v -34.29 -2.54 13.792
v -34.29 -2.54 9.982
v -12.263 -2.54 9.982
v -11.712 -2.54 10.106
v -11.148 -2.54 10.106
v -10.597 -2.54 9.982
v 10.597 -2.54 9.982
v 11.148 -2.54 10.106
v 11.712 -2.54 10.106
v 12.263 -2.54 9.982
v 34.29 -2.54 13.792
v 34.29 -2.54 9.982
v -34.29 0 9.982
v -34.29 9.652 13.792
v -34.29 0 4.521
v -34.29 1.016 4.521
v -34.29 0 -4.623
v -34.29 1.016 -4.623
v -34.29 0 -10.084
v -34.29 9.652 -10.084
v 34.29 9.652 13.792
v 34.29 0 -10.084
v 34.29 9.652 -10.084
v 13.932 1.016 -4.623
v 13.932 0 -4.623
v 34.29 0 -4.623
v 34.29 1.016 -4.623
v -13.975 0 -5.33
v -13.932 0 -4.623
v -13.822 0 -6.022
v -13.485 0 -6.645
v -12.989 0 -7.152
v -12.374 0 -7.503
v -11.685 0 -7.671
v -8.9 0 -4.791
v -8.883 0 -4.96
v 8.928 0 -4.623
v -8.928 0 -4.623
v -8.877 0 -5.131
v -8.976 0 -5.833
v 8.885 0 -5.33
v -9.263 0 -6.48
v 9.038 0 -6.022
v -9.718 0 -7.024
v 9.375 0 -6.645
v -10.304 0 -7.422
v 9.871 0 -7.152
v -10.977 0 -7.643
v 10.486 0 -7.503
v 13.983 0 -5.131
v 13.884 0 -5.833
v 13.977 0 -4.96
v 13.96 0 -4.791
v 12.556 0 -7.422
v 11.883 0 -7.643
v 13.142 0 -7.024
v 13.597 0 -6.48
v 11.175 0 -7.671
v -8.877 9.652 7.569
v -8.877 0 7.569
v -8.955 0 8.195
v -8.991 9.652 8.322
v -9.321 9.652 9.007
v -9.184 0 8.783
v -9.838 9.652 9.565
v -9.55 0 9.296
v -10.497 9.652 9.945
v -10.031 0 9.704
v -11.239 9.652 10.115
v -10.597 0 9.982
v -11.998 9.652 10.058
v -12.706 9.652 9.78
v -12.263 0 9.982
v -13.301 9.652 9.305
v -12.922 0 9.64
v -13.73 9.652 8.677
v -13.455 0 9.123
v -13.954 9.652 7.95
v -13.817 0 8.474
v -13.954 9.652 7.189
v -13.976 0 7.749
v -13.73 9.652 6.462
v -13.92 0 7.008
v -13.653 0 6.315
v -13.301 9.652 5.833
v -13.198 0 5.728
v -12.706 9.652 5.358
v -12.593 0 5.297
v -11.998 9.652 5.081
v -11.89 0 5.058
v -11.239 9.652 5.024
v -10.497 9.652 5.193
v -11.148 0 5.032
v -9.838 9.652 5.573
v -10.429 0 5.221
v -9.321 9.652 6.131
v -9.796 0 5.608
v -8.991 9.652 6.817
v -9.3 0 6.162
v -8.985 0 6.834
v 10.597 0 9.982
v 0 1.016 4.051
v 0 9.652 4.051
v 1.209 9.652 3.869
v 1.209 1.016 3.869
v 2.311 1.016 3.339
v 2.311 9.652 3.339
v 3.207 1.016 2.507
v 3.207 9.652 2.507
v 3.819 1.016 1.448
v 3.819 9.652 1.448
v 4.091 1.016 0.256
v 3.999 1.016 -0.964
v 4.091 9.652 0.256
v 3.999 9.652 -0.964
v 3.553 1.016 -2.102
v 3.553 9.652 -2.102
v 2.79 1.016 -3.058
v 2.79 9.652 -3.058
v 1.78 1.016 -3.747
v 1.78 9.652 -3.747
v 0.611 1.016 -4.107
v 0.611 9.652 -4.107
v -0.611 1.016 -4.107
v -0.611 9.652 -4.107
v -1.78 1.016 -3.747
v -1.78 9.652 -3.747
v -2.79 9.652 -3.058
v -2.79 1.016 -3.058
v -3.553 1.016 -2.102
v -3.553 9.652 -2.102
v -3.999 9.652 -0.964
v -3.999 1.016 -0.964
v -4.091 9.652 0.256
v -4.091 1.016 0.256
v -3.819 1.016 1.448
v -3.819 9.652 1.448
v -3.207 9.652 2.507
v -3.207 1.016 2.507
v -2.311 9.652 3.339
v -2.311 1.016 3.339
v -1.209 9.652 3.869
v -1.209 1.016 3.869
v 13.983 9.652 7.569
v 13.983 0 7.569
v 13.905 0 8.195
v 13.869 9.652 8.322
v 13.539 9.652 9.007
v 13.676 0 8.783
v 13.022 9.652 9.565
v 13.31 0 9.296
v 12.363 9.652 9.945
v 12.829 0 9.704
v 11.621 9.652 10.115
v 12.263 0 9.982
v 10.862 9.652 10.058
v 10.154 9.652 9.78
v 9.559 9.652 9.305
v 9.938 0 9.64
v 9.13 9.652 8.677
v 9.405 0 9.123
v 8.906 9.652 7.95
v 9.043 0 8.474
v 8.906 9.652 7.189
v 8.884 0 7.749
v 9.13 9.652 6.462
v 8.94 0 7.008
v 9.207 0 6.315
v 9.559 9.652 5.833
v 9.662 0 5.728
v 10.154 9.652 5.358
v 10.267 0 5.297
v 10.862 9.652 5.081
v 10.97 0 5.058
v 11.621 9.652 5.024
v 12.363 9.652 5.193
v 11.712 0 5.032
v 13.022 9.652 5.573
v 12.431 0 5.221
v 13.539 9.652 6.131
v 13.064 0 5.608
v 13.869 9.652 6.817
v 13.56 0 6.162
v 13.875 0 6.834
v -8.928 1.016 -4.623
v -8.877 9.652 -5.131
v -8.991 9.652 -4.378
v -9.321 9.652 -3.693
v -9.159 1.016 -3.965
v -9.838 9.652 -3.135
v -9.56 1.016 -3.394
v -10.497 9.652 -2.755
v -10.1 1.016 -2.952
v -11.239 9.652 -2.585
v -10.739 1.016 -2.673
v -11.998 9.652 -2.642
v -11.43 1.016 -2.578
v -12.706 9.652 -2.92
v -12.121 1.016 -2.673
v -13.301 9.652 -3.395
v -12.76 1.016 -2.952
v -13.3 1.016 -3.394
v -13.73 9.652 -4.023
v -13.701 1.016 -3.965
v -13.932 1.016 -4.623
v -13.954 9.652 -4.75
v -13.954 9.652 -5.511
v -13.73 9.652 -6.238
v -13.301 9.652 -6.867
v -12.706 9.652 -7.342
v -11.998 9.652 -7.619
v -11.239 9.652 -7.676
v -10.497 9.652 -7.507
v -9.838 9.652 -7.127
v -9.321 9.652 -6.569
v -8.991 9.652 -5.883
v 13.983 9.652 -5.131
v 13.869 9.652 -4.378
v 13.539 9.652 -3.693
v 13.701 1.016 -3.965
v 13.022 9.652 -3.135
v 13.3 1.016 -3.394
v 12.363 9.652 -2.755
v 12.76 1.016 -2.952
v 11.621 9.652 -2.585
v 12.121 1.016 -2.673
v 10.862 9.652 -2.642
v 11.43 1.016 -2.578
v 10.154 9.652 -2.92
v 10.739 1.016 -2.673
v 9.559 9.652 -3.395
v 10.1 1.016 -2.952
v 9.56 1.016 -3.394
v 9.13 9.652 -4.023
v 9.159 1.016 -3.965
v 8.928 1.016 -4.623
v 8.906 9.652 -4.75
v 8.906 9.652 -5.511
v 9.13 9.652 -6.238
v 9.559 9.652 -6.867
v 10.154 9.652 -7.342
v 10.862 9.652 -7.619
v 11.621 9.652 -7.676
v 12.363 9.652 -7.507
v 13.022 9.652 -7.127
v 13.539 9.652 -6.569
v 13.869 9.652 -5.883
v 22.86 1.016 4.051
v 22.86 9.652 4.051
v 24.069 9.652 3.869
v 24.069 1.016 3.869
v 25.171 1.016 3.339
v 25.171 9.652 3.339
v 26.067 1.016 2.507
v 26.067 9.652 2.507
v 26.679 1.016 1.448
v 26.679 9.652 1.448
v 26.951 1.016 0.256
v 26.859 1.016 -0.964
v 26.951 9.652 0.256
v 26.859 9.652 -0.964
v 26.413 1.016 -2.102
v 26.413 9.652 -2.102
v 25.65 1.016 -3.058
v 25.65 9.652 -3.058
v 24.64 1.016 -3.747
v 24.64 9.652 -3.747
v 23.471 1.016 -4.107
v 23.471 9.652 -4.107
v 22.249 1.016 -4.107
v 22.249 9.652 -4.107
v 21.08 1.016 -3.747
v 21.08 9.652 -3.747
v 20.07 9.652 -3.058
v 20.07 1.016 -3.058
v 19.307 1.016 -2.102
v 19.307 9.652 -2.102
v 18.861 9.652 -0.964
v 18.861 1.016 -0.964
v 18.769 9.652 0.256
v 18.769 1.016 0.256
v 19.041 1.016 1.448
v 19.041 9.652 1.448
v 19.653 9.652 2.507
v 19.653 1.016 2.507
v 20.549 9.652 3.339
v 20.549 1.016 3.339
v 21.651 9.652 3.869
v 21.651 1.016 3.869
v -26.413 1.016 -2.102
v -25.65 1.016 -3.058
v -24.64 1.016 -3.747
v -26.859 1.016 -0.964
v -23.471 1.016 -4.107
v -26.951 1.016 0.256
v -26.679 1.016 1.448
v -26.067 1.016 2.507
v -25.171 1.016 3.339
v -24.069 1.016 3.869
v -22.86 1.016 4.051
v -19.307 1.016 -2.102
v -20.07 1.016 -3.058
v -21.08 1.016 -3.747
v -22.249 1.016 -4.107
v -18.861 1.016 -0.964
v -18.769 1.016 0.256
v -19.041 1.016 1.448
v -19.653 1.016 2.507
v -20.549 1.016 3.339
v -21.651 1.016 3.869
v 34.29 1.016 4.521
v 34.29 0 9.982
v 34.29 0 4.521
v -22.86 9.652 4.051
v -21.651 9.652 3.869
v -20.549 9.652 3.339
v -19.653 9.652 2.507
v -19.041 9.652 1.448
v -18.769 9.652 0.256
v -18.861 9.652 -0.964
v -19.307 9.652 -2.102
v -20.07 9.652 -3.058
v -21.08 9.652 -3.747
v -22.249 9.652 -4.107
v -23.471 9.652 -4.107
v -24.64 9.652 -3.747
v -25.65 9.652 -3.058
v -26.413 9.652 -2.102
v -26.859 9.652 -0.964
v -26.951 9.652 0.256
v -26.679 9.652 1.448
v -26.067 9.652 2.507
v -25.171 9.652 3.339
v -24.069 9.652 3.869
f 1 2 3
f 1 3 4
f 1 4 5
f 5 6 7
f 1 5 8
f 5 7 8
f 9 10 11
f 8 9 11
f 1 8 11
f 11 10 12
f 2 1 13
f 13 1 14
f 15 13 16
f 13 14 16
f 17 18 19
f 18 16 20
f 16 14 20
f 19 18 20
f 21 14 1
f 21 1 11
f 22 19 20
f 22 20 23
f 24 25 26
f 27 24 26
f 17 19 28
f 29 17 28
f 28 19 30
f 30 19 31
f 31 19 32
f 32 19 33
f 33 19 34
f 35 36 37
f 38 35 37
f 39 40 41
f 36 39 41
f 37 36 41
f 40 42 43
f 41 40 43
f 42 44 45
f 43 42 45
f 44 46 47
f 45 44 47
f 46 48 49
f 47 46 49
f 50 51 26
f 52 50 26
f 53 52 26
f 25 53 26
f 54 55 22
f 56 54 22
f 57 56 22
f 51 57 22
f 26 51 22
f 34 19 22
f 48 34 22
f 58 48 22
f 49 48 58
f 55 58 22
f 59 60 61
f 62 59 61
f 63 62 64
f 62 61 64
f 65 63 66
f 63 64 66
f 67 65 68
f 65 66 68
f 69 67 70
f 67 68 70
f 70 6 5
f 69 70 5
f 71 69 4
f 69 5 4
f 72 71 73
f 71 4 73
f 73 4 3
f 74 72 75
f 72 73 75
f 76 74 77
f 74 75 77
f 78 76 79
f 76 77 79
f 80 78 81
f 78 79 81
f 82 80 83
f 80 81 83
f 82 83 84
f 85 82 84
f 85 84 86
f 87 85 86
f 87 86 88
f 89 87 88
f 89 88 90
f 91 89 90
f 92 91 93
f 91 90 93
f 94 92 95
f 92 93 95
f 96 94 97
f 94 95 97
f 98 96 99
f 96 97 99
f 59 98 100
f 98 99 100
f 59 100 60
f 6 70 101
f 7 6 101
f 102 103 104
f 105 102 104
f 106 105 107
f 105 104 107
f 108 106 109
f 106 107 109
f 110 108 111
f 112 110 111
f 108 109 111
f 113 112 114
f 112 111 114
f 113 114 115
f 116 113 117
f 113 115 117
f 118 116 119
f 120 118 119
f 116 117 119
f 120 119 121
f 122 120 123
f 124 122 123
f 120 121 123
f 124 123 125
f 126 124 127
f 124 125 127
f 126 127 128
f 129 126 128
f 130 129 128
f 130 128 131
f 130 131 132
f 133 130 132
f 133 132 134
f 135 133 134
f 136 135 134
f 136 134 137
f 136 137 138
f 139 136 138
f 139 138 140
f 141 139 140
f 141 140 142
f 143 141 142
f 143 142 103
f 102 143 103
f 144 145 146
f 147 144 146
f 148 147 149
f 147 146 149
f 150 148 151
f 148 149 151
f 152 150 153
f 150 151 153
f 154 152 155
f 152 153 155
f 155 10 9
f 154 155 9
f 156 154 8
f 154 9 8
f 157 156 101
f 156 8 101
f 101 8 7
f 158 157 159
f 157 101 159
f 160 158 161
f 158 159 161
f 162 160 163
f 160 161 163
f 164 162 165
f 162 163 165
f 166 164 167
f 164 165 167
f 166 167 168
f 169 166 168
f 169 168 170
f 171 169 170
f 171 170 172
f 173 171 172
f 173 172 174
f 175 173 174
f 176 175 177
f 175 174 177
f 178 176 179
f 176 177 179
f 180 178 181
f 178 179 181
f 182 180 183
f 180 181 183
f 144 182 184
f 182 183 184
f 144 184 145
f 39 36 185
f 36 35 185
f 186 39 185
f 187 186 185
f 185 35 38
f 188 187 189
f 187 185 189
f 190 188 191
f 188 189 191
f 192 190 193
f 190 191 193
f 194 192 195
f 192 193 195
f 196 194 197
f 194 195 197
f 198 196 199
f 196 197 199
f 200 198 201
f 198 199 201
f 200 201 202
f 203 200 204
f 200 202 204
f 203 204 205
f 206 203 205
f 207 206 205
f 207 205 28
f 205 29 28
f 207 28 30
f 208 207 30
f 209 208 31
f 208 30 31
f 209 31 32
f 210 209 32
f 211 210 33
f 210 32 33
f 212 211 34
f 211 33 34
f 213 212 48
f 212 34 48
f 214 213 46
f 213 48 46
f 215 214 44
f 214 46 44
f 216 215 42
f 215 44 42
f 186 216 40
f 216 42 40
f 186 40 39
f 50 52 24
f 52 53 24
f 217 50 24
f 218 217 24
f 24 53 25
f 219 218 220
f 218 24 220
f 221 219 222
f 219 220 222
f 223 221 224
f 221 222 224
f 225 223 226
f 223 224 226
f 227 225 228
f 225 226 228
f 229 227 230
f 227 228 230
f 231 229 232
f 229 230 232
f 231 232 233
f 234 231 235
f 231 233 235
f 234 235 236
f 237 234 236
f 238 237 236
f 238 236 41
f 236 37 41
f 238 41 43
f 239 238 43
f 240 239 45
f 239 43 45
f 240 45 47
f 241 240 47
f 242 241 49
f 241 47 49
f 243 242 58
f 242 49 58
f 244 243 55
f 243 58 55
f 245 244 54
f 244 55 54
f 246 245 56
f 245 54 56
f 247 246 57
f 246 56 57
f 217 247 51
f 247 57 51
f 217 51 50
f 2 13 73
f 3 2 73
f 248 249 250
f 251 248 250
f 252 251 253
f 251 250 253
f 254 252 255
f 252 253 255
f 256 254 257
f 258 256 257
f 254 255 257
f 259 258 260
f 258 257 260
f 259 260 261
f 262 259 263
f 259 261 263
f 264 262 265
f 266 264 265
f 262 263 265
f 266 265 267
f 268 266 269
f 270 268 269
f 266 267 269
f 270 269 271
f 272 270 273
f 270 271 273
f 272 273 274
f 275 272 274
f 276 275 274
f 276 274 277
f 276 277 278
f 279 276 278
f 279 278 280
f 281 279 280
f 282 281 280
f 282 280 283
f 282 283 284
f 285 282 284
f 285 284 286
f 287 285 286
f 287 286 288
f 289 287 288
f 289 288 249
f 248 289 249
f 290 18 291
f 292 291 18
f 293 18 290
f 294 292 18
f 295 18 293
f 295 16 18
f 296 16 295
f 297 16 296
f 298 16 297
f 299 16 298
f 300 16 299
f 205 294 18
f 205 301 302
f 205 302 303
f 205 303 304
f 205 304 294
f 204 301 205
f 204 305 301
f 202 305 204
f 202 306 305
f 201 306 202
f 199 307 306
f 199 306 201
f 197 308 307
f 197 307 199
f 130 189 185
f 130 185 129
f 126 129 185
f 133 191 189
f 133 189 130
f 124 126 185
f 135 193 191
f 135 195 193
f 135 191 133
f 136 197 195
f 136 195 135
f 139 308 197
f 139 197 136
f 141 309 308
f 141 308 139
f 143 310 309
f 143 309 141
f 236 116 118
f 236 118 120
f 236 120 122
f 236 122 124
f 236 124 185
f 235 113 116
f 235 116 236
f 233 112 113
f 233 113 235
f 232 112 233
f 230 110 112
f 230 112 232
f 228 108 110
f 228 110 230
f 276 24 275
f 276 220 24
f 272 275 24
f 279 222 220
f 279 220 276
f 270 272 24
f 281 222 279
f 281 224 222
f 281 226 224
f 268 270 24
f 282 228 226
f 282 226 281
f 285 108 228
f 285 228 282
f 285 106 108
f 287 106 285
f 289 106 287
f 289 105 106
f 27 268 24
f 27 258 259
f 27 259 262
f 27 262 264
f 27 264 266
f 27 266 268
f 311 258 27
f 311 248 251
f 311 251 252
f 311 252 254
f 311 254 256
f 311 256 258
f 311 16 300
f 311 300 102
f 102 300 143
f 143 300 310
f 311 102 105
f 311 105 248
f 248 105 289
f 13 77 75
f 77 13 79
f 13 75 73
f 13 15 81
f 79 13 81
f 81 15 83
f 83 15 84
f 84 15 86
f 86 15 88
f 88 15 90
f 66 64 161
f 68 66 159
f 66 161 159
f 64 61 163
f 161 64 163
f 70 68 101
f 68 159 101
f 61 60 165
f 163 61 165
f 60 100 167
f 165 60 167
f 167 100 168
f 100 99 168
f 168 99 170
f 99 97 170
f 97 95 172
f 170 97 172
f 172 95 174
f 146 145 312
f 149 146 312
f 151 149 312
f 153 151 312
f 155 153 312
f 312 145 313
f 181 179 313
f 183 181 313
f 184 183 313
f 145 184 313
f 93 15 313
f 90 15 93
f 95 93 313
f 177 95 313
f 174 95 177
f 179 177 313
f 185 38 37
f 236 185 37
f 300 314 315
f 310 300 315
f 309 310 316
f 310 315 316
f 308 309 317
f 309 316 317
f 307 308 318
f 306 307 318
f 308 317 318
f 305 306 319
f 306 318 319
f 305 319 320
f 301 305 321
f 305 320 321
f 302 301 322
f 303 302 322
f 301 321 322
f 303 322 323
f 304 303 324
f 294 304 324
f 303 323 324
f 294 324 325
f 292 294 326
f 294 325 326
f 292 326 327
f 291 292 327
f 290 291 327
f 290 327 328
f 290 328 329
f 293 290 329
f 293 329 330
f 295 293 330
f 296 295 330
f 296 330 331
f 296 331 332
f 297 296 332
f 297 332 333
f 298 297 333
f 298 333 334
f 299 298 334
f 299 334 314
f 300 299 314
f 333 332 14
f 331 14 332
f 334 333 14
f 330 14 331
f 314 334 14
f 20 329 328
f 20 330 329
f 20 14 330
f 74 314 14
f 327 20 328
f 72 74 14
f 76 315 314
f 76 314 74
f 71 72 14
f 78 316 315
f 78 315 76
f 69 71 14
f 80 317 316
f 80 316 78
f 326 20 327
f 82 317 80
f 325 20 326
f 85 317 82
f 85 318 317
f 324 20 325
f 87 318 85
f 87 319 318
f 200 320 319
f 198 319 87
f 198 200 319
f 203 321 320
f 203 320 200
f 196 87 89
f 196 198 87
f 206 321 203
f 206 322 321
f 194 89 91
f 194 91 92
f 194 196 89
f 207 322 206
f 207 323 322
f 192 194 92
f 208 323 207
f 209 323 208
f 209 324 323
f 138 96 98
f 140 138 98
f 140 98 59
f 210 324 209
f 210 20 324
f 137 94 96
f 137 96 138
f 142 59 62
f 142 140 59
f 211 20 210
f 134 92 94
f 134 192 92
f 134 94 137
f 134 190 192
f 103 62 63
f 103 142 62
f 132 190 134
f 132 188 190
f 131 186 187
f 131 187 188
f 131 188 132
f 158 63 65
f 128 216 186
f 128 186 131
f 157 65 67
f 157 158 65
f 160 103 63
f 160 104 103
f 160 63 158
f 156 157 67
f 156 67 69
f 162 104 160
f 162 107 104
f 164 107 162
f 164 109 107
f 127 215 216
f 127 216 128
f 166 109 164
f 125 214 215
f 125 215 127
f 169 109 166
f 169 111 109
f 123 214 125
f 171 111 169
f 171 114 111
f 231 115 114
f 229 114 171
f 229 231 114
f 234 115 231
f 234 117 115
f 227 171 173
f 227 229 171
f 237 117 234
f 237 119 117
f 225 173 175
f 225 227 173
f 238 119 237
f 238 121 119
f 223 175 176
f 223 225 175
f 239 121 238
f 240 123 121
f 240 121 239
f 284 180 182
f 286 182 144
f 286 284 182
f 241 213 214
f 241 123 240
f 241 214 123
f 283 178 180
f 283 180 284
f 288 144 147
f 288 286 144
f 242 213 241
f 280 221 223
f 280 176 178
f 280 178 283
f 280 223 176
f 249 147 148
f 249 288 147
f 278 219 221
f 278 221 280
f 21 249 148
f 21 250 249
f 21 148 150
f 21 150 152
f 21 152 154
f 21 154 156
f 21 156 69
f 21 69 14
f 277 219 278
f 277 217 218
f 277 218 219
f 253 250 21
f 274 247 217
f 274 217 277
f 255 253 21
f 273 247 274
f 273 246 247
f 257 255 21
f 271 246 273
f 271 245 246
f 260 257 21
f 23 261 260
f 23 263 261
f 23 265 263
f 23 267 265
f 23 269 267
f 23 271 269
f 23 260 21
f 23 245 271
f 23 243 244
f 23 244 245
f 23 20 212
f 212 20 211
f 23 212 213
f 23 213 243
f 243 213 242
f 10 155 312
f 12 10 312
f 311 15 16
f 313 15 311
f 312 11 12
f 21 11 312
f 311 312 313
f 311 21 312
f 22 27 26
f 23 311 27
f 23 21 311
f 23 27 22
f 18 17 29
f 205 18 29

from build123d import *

# Parameters (mm, degrees)
SKETCH1_W                   = 68.58
SKETCH1_H                   = 22.86
EXTRUDE1_DEPTH              = 9.652
SKETCH4_W                   = 68.58
SKETCH4_H                   = 3.81
EXTRUDE3_DEPTH              = 12.192
F_5_16_CLEARANCE_HOLE1_D    = 8.2042
SKETCH3_W                   = 68.58
SKETCH3_H                   = 9.144
EXTRUDE2_DEPTH              = 1.016
SKETCH6_W                   = 68.58
SKETCH6_H                   = 1.3462
CUT_EXTRUDE2_DEPTH          = 10.652
F_1_4_20_TAPPED_HOLE1_D     = 5.1054
F_1_4_20_TAPPED_HOLE1_DEPTH = 19.05
F_1_4_20_TAPPED_HOLE1_TIP   = 1.533816902


with BuildPart() as part:
    # Sketch1 → Extrude1 (new body)
    with BuildSketch(Plane(origin=(0, 0, 0), x_dir=(1, 0, 0), z_dir=(0, 1, 0))):
        Rectangle(SKETCH1_W, SKETCH1_H)
    extrude(amount=EXTRUDE1_DEPTH)

    # Sketch4 → Extrude3 (add)
    with BuildSketch(Plane(origin=(0, 9.652, 0), x_dir=(1, 0, 0), z_dir=(0, 1, 0))):
        with Locations((0, -11.8872)):
            Rectangle(SKETCH4_W, SKETCH4_H)
    extrude(amount=-EXTRUDE3_DEPTH)

    # 5/16 Clearance Hole1 (through all)
    with Locations(Plane(origin=(-22.86, 0, -0.0508), x_dir=(0, 0, -1), z_dir=(0, -1, 0))):
        with Locations((0, 0), (0, 45.72), (0, 22.86)):
            Hole(F_5_16_CLEARANCE_HOLE1_D / 2)

    # Sketch3 → Extrude2 (cut)
    with BuildSketch(Plane.XZ):
        with Locations((0, -0.0508)):
            Rectangle(SKETCH3_W, SKETCH3_H)
    extrude(amount=-EXTRUDE2_DEPTH, mode=Mode.SUBTRACT)

    # Sketch6 → Cut-Extrude2 (cut, through all)
    with BuildSketch(Plane.XZ):
        with Locations((0, -10.7569)):
            Rectangle(SKETCH6_W, SKETCH6_H)
    extrude(amount=-CUT_EXTRUDE2_DEPTH, mode=Mode.SUBTRACT)

    # 1/4-20 Tapped Hole1
    with Locations(Plane(origin=(0, 9.652, 0), x_dir=(-1, 0, 0), z_dir=(0, 1, 0))):
        with Locations((11.43, -5.1308), (11.43, 7.5692), (-11.43, 7.5692), (-11.43, -5.1308)):
            Hole(F_1_4_20_TAPPED_HOLE1_D / 2, depth=F_1_4_20_TAPPED_HOLE1_DEPTH)
            with Locations((0, 0, -(F_1_4_20_TAPPED_HOLE1_DEPTH + F_1_4_20_TAPPED_HOLE1_TIP / 2))):  # 118° drill point
                Cone(0, F_1_4_20_TAPPED_HOLE1_D / 2, F_1_4_20_TAPPED_HOLE1_TIP, mode=Mode.SUBTRACT)


solid = part.part
